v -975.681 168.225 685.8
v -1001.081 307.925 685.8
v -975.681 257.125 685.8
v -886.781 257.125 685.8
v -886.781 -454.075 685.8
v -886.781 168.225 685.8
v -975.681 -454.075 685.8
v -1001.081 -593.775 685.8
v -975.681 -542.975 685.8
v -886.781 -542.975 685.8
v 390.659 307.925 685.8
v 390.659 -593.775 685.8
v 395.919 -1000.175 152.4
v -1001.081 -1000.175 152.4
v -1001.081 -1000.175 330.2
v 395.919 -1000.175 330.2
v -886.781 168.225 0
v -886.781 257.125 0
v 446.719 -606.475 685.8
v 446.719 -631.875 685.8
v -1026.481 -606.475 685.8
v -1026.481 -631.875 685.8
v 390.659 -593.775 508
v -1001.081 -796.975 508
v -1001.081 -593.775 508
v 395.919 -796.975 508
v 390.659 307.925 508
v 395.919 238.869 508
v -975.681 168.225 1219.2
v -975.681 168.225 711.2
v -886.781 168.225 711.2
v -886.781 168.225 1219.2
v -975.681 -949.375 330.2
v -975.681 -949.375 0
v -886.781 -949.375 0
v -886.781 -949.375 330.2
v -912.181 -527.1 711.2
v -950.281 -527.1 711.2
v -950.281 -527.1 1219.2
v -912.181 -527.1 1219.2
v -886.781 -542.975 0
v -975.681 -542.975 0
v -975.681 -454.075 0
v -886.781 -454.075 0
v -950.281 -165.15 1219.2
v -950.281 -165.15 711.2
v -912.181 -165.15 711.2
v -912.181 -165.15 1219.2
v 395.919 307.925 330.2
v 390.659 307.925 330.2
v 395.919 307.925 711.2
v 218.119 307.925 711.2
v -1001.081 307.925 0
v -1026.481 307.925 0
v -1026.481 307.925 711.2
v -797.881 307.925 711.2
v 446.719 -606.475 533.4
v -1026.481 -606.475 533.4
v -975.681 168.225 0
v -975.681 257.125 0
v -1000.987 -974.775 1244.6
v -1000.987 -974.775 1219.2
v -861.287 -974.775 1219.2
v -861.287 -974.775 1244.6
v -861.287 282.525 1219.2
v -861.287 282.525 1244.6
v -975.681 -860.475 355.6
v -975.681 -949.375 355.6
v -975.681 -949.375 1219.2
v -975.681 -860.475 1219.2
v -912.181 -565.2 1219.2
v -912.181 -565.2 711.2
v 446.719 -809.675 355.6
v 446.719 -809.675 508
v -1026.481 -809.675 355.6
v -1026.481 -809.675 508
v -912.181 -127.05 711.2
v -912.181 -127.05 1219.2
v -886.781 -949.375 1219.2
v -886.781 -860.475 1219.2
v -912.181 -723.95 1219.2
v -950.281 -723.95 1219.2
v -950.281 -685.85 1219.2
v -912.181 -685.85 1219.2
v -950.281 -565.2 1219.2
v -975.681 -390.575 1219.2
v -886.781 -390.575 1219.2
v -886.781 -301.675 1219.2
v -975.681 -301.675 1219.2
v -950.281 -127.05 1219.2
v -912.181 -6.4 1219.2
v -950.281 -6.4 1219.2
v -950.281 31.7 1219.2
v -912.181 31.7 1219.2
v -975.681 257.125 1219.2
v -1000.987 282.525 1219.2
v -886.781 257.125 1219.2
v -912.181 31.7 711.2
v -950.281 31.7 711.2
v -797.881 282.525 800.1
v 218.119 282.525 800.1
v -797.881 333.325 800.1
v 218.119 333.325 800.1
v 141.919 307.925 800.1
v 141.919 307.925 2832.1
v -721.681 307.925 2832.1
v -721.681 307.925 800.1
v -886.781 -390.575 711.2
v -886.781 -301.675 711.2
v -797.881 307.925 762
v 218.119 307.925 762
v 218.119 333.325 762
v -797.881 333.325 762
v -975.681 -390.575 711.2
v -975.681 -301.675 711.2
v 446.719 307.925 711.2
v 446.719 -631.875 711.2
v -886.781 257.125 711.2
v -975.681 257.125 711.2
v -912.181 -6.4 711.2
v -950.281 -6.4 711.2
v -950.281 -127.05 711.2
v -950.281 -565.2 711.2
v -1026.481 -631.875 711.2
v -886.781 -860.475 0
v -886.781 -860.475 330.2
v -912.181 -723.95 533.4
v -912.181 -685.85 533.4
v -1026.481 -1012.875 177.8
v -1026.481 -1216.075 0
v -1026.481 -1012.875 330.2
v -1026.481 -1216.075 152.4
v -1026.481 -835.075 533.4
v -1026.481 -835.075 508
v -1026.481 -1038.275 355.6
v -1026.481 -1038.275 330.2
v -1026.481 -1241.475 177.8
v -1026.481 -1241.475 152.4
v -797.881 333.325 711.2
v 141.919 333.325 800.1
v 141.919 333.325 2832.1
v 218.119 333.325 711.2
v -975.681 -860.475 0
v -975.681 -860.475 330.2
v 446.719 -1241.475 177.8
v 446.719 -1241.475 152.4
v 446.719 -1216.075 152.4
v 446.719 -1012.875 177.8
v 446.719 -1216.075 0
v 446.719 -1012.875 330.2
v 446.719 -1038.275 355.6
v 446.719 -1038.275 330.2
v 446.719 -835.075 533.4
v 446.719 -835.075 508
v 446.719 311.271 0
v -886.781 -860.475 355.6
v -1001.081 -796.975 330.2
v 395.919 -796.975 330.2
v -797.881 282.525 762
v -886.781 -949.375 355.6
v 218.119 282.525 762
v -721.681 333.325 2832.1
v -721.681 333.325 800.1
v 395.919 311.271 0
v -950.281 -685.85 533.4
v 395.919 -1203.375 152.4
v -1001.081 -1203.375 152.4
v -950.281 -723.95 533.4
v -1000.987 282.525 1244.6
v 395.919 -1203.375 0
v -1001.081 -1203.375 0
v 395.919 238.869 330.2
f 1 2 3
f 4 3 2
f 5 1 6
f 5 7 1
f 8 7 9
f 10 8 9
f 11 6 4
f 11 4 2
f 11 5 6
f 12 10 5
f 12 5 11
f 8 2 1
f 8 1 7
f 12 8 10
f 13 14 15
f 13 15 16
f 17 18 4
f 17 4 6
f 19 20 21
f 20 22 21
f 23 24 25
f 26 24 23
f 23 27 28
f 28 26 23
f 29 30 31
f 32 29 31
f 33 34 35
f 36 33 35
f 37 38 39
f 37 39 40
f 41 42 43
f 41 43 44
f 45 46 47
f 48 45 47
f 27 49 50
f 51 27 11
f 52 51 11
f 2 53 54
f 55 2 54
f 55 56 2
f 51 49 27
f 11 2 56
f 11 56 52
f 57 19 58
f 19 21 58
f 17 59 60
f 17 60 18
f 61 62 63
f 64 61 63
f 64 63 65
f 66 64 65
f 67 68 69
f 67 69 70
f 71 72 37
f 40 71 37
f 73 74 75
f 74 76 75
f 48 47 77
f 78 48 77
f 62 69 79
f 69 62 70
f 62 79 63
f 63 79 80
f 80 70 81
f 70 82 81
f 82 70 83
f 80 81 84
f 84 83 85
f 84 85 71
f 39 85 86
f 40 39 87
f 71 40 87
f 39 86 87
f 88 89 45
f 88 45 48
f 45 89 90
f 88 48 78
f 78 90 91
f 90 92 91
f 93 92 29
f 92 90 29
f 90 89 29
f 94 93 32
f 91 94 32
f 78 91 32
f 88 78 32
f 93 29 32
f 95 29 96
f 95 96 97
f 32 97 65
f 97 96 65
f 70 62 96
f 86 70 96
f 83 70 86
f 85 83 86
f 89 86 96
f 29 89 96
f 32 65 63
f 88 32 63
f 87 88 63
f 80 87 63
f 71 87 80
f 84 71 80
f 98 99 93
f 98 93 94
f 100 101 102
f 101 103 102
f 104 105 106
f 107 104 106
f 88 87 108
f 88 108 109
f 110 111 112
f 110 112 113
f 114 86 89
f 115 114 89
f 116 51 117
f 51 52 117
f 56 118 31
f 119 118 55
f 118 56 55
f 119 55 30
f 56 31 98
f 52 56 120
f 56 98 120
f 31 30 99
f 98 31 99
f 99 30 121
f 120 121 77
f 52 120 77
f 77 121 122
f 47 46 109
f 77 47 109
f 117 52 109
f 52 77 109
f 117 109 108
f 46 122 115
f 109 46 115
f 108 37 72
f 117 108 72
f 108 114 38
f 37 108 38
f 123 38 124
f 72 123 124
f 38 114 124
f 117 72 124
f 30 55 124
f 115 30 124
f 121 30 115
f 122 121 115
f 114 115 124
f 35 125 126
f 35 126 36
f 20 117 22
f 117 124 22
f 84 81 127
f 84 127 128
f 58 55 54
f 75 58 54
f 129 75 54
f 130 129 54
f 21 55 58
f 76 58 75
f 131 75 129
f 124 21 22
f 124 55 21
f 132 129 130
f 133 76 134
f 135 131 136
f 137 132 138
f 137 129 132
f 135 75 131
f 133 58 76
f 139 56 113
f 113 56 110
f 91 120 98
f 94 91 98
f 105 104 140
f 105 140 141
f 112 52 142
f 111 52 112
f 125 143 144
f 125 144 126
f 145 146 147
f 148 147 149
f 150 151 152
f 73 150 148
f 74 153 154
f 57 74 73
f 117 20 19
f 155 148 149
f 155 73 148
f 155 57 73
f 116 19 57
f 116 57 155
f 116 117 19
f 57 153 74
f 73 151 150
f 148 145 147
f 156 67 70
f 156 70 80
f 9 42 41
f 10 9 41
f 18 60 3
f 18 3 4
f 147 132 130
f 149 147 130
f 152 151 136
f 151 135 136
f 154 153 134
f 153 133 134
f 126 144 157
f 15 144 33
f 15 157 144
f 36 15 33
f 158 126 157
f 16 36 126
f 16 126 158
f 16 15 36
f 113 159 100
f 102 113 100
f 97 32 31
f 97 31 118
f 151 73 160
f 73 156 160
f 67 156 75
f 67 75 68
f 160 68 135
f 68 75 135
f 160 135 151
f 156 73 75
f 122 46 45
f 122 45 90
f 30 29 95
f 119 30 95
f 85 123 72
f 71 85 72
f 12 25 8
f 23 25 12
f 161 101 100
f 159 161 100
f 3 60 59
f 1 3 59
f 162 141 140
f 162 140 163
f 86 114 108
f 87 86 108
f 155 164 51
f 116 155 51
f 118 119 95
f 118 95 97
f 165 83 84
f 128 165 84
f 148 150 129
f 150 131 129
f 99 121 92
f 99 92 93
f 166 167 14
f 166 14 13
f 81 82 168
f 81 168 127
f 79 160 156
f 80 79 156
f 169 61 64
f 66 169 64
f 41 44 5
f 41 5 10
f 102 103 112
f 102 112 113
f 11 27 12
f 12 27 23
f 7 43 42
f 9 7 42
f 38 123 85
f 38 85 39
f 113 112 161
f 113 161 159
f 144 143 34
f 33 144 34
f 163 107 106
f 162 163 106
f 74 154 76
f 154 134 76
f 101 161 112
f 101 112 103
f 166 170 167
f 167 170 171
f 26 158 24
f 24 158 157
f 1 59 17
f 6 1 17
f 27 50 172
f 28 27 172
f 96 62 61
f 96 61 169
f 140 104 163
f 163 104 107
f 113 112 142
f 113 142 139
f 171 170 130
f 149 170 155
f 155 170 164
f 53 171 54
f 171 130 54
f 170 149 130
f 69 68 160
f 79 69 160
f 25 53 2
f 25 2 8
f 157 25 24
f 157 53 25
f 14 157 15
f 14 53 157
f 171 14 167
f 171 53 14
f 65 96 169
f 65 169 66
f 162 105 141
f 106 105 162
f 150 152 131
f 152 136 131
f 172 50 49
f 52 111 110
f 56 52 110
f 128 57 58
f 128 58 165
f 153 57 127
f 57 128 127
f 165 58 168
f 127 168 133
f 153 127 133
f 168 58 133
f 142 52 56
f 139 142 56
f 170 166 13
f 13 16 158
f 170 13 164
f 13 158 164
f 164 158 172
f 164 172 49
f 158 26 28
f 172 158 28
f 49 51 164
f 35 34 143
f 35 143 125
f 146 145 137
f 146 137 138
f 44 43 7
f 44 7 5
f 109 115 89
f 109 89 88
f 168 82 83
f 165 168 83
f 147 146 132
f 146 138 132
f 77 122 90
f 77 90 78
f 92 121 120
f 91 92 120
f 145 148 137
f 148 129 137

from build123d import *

# Parameters (mm, degrees)
F1_DEPTH       = 711.2
F3_DEPTH       = 533.4
F5_DEPTH       = 355.6
F7_DEPTH       = 177.8
F8_W           = 88.9
F8_H           = 88.9
F8_W_2         = 38.1
F8_H_2         = 38.1
F9_DEPTH       = 1219.2
F10_W          = 139.7
F10_H          = 1257.3
F11_DEPTH      = 25.4
F12_W          = 863.6
F12_H          = 2032
F13_DEPTH      = 25.4
F14_W          = 1016
F14_H          = 38.1
F15_DEPTH      = 25.4
F15_DEPTH_BACK = 25.4
F16_W          = 1016
F16_H          = 50.8
F17_DEPTH      = 25.4
F18_W          = 38.1
F18_H          = 38.1
F18_W_2        = 88.9
F18_H_2        = 88.9
F19_DEPTH      = 25.4
F21_DEPTH      = 25.4
F23_DEPTH      = 25.4
F25_DEPTH      = 25.4
F30_W          = 1391.7394877579
F30_H          = 901.7
F31_DEPTH      = 685.8
F33_DEPTH      = 508
F34_W          = 1422.4
F34_H          = 1308.1
F35_DEPTH      = 330.2
F37_DEPTH      = 152.4
F38_W          = 88.9
F38_H          = 88.9
F40_W          = 1272.0178561494
F40_H          = 1746.8100812477
F41_DEPTH      = 2006.6
F43_DEPTH      = 50.8


with BuildPart() as f1:
    # F0 (on Top) → F1 (new body)
    with BuildSketch(Plane.XY):
        Polygon((802.3194193208, 307.9249393946), (-1026.4805806792, 307.9249393946), (-1026.4805806792, -606.4750606054), (395.9194193208, -606.4750606054), (802.3194193208, -200.0750606054), align=None)
    extrude(amount=F1_DEPTH)

    # F2 (on Top) → F3 (join)
    with BuildSketch(Plane.XY):
        Polygon((395.9194193208, -606.4750606054), (-1026.4805806792, -606.4750606054), (-1026.4805806792, -809.6750606054), (480.087615195, -809.6750606054), (1005.5194193208, -284.2432564796), (1005.5194193208, 307.9249393946), (802.3194193208, 307.9249393946), (802.3194193208, -200.0750606054), align=None)
    extrude(amount=F3_DEPTH)

    # F4 (on Top) → F5 (join)
    with BuildSketch(Plane.XY):
        Polygon((480.087615195, -809.6750606054), (-1026.4805806792, -809.6750606054), (-1026.4805806792, -1012.8750606054), (564.2558110692, -1012.8750606054), (1208.7194193208, -368.4114523538), (1208.7194193208, 307.9249393946), (1005.5194193208, 307.9249393946), (1005.5194193208, -284.2432564796), align=None)
    extrude(amount=F5_DEPTH)

    # F6 (on Top) → F7 (join)
    with BuildSketch(Plane.XY):
        Polygon((564.2558110692, -1012.8750606054), (-1026.4805806792, -1012.8750606054), (-1026.4805806792, -1216.0750606054), (648.4240069434, -1216.0750606054), (1411.9194193208, -452.579648228), (1411.9194193208, 307.9249393946), (1208.7194193208, 307.9249393946), (1208.7194193208, -368.4114523538), align=None)
    extrude(amount=F7_DEPTH)

    # F8 (on Top) → F9 (join)
    with BuildSketch(Plane.XY):
        with Locations((-931.2305806792, -904.9250606054)):
            Rectangle(F8_W, F8_H)
        with Locations((-931.2305806792, 212.6749393946)):
            Rectangle(F8_W, F8_H)
        with Locations((-931.2305806792, -346.1250606054)):
            Rectangle(F8_W, F8_H)
        with Locations((-931.2305806792, 12.6499393946)):
            Rectangle(F8_W_2, F8_H_2)
        with Locations((-931.2305806792, -146.1000606054)):
            Rectangle(F8_W_2, F8_H_2)
        with Locations((-931.2305806792, -546.1500606054)):
            Rectangle(F8_W_2, F8_H_2)
        with Locations((-931.2305806792, -704.9000606054)):
            Rectangle(F8_W_2, F8_H_2)
    extrude(amount=F9_DEPTH)

    # F10 (on face) → F11 (join)
    with BuildSketch(Plane.XY.offset(1219.2)):
        with Locations((-931.1371445656, -346.1250606054)):
            Rectangle(F10_W, F10_H)
    extrude(amount=F11_DEPTH)



with BuildPart() as f13:
    # F12 (on face) → F13 (new body)
    with BuildSketch(Plane(origin=(0, 307.9249393946, 0), x_dir=(-1, 0, 0), z_dir=(0, 1, 0))):
        with Locations((289.8805806792, 1816.1)):
            Rectangle(F12_W, F12_H)
    extrude(amount=F13_DEPTH)


with BuildPart() as f15:
    # F14 (on face) → F15 (new body, two sides)
    with BuildSketch(Plane(origin=(0, 307.9249393946, 0), x_dir=(-1, 0, 0), z_dir=(0, 1, 0))) as f15_sk:
        with Locations((289.8805806792, 781.05)):
            Rectangle(F14_W, F14_H)
    extrude(amount=F15_DEPTH)
    extrude(f15_sk.sketch, amount=-F15_DEPTH_BACK)


with BuildPart() as f17:
    # F16 (on face) → F17 (new body)
    with BuildSketch(Plane(origin=(0, 307.9249393946, 0), x_dir=(-1, 0, 0), z_dir=(0, 1, 0))):
        with Locations((289.8805806792, 736.6)):
            Rectangle(F16_W, F16_H)
    extrude(amount=F17_DEPTH)


with BuildPart() as f1_1:
    add(f1.part)

    add(f17.part)  # F19 merges F17
    # F18 (on face) → F19 (join)
    with BuildSketch(Plane.XY.offset(711.2)):
        Polygon((395.9194193208, -606.4750606054), (-1026.4805806792, -606.4750606054), (-1026.4805806792, -631.8750606054), (406.4404438051, -631.8750606054), (827.7194193208, -210.5960850896), (827.7194193208, 307.9249393946), (802.3194193208, 307.9249393946), (802.3194193208, -200.0750606054), align=None)
        Polygon((-1026.4805806792, 307.9249393946), (-1026.4805806792, -606.4750606054), (395.9194193208, -606.4750606054), (802.3194193208, -200.0750606054), (802.3194193208, 307.9249393946), align=None)
        with Locations((-931.2305806792, -546.1500606054)):
            Rectangle(F18_W, F18_H, mode=Mode.SUBTRACT)
        with Locations((-931.2305806792, -346.1250606054)):
            Rectangle(F18_W_2, F18_H_2, mode=Mode.SUBTRACT)
        with Locations((-931.2305806792, -146.1000606054)):
            Rectangle(F18_W, F18_H, mode=Mode.SUBTRACT)
        with Locations((-931.2305806792, 12.6499393946)):
            Rectangle(F18_W, F18_H, mode=Mode.SUBTRACT)
        with Locations((-931.2305806792, 212.6749393946)):
            Rectangle(F18_W_2, F18_H_2, mode=Mode.SUBTRACT)
    extrude(amount=-F19_DEPTH)

    # F20 (on face) → F21 (join)
    with BuildSketch(Plane.XY.offset(533.4)):
        Polygon((480.087615195, -809.6750606054), (-1026.4805806792, -809.6750606054), (-1026.4805806792, -835.0750606054), (490.6086396793, -835.0750606054), (1030.9194193208, -294.7642809639), (1030.9194193208, 308.4329366684), (1005.5194193208, 307.9249393946), (1005.5194193208, -284.2432564796), align=None)
    extrude(amount=-F21_DEPTH)

    # F22 (on face) → F23 (join)
    with BuildSketch(Plane.XY.offset(355.6)):
        Polygon((564.2558110692, -1012.8750606054), (-1026.4805806792, -1012.8750606054), (-1026.4805806792, -1038.2750606054), (574.7768355535, -1038.2750606054), (1234.1194193208, -378.9324768381), (1234.1194193208, 307.9249393946), (1208.7194193208, 307.9249393946), (1208.7194193208, -368.4114523538), align=None)
    extrude(amount=-F23_DEPTH)

    # F24 (on face) → F25 (join)
    with BuildSketch(Plane.XY.offset(177.8)):
        Polygon((648.4240069434, -1216.0750606054), (-1026.4805806792, -1216.0750606054), (-1026.4805806792, -1241.4750606054), (658.9450314277, -1241.4750606054), (1439.038190565, -461.3819014681), (1437.3194193208, 307.9249393946), (1411.9194193208, 307.9249393946), (1411.9194193208, -452.579648228), align=None)
    extrude(amount=-F25_DEPTH)

    # F30 (on face) → F31 (cut, through all)
    with BuildSketch(Plane(origin=(0, 0, 0), x_dir=(1, 0, 0), z_dir=(0, 0, -1))):
        with Locations((-305.2108368003, 142.9250606054)):
            Rectangle(F30_W, F30_H)
    extrude(amount=-F31_DEPTH, mode=Mode.SUBTRACT)

    # F32 (on face) → F33 (cut, through all)
    with BuildSketch(Plane(origin=(0, 0, 0), x_dir=(1, 0, 0), z_dir=(0, 0, -1))):
        Polygon((474.8271029529, 796.9750606054), (-1001.0805806792, 796.9750606054), (-1001.0805806792, -307.9249393946), (390.6589070787, -307.9249393946), align=None)
    extrude(amount=-F33_DEPTH, mode=Mode.SUBTRACT)

    # F34 (on face) → F35 (cut, through all)
    with BuildSketch(Plane(origin=(0, 0, 0), x_dir=(1, 0, 0), z_dir=(0, 0, -1))):
        with Locations((-289.8805806792, 346.1250606054)):
            Rectangle(F34_W, F34_H)
    extrude(amount=-F35_DEPTH, mode=Mode.SUBTRACT)

    # F36 (on face) → F37 (cut, through all)
    with BuildSketch(Plane(origin=(0, 0, 0), x_dir=(1, 0, 0), z_dir=(0, 0, -1))):
        Polygon((637.8720402718, 1203.3750606054), (-1001.0805806792, 1203.3750606054), (-1001.0805806792, -307.9249393946), (648.4240069434, -307.9249393946), (648.4240069434, 1192.8230939337), align=None)
    extrude(amount=-F37_DEPTH, mode=Mode.SUBTRACT)

    # F38 (on face) → F39 (join, up to the next surface of F1)
    with BuildSketch(Plane(origin=(0, 0, 0), x_dir=(1, 0, 0), z_dir=(0, 0, -1))):
        with Locations((-931.2305806792, -212.6749393946)):
            Rectangle(F38_W, F38_H)
        with Locations((-931.2305806792, 498.5250606054)):
            Rectangle(F38_W, F38_H)
        with Locations((-931.2305806792, 904.9250606054)):
            Rectangle(F38_W, F38_H)
    extrude(until=Until.NEXT, dir=(0, 0, 1))

    # F40 (on face) → F41 (cut)
    with BuildSketch(Plane.XY.offset(711.2)):
        with Locations((1031.9283473955, -472.5622981787)):
            Rectangle(F40_W, F40_H)
    extrude(amount=-F41_DEPTH, mode=Mode.SUBTRACT)

    # F42 (on face) → F43 (join)
    with BuildSketch(Plane.YZ.offset(395.9194193208)):
        Polygon((311.2705349922, 0), (307.9249393946, 711.2), (-631.8750606054, 711.2), (-631.8750606054, 685.8), (-606.4750606054, 685.8), (-606.4750606054, 533.4), (-835.0750606054, 533.4), (-835.0750606054, 508), (-809.6750606054, 508), (-809.6750606054, 355.6), (-1038.2750606054, 355.6), (-1038.2750606054, 330.2), (-1012.8750606054, 330.2), (-1012.8750606054, 177.8), (-1241.4750606054, 177.8), (-1241.4750606054, 152.4), (-1216.0750606054, 152.4), (-1216.0750606054, 0), align=None)
    extrude(amount=F43_DEPTH)


solid = Compound([f13.part, f15.part, f1_1.part])
